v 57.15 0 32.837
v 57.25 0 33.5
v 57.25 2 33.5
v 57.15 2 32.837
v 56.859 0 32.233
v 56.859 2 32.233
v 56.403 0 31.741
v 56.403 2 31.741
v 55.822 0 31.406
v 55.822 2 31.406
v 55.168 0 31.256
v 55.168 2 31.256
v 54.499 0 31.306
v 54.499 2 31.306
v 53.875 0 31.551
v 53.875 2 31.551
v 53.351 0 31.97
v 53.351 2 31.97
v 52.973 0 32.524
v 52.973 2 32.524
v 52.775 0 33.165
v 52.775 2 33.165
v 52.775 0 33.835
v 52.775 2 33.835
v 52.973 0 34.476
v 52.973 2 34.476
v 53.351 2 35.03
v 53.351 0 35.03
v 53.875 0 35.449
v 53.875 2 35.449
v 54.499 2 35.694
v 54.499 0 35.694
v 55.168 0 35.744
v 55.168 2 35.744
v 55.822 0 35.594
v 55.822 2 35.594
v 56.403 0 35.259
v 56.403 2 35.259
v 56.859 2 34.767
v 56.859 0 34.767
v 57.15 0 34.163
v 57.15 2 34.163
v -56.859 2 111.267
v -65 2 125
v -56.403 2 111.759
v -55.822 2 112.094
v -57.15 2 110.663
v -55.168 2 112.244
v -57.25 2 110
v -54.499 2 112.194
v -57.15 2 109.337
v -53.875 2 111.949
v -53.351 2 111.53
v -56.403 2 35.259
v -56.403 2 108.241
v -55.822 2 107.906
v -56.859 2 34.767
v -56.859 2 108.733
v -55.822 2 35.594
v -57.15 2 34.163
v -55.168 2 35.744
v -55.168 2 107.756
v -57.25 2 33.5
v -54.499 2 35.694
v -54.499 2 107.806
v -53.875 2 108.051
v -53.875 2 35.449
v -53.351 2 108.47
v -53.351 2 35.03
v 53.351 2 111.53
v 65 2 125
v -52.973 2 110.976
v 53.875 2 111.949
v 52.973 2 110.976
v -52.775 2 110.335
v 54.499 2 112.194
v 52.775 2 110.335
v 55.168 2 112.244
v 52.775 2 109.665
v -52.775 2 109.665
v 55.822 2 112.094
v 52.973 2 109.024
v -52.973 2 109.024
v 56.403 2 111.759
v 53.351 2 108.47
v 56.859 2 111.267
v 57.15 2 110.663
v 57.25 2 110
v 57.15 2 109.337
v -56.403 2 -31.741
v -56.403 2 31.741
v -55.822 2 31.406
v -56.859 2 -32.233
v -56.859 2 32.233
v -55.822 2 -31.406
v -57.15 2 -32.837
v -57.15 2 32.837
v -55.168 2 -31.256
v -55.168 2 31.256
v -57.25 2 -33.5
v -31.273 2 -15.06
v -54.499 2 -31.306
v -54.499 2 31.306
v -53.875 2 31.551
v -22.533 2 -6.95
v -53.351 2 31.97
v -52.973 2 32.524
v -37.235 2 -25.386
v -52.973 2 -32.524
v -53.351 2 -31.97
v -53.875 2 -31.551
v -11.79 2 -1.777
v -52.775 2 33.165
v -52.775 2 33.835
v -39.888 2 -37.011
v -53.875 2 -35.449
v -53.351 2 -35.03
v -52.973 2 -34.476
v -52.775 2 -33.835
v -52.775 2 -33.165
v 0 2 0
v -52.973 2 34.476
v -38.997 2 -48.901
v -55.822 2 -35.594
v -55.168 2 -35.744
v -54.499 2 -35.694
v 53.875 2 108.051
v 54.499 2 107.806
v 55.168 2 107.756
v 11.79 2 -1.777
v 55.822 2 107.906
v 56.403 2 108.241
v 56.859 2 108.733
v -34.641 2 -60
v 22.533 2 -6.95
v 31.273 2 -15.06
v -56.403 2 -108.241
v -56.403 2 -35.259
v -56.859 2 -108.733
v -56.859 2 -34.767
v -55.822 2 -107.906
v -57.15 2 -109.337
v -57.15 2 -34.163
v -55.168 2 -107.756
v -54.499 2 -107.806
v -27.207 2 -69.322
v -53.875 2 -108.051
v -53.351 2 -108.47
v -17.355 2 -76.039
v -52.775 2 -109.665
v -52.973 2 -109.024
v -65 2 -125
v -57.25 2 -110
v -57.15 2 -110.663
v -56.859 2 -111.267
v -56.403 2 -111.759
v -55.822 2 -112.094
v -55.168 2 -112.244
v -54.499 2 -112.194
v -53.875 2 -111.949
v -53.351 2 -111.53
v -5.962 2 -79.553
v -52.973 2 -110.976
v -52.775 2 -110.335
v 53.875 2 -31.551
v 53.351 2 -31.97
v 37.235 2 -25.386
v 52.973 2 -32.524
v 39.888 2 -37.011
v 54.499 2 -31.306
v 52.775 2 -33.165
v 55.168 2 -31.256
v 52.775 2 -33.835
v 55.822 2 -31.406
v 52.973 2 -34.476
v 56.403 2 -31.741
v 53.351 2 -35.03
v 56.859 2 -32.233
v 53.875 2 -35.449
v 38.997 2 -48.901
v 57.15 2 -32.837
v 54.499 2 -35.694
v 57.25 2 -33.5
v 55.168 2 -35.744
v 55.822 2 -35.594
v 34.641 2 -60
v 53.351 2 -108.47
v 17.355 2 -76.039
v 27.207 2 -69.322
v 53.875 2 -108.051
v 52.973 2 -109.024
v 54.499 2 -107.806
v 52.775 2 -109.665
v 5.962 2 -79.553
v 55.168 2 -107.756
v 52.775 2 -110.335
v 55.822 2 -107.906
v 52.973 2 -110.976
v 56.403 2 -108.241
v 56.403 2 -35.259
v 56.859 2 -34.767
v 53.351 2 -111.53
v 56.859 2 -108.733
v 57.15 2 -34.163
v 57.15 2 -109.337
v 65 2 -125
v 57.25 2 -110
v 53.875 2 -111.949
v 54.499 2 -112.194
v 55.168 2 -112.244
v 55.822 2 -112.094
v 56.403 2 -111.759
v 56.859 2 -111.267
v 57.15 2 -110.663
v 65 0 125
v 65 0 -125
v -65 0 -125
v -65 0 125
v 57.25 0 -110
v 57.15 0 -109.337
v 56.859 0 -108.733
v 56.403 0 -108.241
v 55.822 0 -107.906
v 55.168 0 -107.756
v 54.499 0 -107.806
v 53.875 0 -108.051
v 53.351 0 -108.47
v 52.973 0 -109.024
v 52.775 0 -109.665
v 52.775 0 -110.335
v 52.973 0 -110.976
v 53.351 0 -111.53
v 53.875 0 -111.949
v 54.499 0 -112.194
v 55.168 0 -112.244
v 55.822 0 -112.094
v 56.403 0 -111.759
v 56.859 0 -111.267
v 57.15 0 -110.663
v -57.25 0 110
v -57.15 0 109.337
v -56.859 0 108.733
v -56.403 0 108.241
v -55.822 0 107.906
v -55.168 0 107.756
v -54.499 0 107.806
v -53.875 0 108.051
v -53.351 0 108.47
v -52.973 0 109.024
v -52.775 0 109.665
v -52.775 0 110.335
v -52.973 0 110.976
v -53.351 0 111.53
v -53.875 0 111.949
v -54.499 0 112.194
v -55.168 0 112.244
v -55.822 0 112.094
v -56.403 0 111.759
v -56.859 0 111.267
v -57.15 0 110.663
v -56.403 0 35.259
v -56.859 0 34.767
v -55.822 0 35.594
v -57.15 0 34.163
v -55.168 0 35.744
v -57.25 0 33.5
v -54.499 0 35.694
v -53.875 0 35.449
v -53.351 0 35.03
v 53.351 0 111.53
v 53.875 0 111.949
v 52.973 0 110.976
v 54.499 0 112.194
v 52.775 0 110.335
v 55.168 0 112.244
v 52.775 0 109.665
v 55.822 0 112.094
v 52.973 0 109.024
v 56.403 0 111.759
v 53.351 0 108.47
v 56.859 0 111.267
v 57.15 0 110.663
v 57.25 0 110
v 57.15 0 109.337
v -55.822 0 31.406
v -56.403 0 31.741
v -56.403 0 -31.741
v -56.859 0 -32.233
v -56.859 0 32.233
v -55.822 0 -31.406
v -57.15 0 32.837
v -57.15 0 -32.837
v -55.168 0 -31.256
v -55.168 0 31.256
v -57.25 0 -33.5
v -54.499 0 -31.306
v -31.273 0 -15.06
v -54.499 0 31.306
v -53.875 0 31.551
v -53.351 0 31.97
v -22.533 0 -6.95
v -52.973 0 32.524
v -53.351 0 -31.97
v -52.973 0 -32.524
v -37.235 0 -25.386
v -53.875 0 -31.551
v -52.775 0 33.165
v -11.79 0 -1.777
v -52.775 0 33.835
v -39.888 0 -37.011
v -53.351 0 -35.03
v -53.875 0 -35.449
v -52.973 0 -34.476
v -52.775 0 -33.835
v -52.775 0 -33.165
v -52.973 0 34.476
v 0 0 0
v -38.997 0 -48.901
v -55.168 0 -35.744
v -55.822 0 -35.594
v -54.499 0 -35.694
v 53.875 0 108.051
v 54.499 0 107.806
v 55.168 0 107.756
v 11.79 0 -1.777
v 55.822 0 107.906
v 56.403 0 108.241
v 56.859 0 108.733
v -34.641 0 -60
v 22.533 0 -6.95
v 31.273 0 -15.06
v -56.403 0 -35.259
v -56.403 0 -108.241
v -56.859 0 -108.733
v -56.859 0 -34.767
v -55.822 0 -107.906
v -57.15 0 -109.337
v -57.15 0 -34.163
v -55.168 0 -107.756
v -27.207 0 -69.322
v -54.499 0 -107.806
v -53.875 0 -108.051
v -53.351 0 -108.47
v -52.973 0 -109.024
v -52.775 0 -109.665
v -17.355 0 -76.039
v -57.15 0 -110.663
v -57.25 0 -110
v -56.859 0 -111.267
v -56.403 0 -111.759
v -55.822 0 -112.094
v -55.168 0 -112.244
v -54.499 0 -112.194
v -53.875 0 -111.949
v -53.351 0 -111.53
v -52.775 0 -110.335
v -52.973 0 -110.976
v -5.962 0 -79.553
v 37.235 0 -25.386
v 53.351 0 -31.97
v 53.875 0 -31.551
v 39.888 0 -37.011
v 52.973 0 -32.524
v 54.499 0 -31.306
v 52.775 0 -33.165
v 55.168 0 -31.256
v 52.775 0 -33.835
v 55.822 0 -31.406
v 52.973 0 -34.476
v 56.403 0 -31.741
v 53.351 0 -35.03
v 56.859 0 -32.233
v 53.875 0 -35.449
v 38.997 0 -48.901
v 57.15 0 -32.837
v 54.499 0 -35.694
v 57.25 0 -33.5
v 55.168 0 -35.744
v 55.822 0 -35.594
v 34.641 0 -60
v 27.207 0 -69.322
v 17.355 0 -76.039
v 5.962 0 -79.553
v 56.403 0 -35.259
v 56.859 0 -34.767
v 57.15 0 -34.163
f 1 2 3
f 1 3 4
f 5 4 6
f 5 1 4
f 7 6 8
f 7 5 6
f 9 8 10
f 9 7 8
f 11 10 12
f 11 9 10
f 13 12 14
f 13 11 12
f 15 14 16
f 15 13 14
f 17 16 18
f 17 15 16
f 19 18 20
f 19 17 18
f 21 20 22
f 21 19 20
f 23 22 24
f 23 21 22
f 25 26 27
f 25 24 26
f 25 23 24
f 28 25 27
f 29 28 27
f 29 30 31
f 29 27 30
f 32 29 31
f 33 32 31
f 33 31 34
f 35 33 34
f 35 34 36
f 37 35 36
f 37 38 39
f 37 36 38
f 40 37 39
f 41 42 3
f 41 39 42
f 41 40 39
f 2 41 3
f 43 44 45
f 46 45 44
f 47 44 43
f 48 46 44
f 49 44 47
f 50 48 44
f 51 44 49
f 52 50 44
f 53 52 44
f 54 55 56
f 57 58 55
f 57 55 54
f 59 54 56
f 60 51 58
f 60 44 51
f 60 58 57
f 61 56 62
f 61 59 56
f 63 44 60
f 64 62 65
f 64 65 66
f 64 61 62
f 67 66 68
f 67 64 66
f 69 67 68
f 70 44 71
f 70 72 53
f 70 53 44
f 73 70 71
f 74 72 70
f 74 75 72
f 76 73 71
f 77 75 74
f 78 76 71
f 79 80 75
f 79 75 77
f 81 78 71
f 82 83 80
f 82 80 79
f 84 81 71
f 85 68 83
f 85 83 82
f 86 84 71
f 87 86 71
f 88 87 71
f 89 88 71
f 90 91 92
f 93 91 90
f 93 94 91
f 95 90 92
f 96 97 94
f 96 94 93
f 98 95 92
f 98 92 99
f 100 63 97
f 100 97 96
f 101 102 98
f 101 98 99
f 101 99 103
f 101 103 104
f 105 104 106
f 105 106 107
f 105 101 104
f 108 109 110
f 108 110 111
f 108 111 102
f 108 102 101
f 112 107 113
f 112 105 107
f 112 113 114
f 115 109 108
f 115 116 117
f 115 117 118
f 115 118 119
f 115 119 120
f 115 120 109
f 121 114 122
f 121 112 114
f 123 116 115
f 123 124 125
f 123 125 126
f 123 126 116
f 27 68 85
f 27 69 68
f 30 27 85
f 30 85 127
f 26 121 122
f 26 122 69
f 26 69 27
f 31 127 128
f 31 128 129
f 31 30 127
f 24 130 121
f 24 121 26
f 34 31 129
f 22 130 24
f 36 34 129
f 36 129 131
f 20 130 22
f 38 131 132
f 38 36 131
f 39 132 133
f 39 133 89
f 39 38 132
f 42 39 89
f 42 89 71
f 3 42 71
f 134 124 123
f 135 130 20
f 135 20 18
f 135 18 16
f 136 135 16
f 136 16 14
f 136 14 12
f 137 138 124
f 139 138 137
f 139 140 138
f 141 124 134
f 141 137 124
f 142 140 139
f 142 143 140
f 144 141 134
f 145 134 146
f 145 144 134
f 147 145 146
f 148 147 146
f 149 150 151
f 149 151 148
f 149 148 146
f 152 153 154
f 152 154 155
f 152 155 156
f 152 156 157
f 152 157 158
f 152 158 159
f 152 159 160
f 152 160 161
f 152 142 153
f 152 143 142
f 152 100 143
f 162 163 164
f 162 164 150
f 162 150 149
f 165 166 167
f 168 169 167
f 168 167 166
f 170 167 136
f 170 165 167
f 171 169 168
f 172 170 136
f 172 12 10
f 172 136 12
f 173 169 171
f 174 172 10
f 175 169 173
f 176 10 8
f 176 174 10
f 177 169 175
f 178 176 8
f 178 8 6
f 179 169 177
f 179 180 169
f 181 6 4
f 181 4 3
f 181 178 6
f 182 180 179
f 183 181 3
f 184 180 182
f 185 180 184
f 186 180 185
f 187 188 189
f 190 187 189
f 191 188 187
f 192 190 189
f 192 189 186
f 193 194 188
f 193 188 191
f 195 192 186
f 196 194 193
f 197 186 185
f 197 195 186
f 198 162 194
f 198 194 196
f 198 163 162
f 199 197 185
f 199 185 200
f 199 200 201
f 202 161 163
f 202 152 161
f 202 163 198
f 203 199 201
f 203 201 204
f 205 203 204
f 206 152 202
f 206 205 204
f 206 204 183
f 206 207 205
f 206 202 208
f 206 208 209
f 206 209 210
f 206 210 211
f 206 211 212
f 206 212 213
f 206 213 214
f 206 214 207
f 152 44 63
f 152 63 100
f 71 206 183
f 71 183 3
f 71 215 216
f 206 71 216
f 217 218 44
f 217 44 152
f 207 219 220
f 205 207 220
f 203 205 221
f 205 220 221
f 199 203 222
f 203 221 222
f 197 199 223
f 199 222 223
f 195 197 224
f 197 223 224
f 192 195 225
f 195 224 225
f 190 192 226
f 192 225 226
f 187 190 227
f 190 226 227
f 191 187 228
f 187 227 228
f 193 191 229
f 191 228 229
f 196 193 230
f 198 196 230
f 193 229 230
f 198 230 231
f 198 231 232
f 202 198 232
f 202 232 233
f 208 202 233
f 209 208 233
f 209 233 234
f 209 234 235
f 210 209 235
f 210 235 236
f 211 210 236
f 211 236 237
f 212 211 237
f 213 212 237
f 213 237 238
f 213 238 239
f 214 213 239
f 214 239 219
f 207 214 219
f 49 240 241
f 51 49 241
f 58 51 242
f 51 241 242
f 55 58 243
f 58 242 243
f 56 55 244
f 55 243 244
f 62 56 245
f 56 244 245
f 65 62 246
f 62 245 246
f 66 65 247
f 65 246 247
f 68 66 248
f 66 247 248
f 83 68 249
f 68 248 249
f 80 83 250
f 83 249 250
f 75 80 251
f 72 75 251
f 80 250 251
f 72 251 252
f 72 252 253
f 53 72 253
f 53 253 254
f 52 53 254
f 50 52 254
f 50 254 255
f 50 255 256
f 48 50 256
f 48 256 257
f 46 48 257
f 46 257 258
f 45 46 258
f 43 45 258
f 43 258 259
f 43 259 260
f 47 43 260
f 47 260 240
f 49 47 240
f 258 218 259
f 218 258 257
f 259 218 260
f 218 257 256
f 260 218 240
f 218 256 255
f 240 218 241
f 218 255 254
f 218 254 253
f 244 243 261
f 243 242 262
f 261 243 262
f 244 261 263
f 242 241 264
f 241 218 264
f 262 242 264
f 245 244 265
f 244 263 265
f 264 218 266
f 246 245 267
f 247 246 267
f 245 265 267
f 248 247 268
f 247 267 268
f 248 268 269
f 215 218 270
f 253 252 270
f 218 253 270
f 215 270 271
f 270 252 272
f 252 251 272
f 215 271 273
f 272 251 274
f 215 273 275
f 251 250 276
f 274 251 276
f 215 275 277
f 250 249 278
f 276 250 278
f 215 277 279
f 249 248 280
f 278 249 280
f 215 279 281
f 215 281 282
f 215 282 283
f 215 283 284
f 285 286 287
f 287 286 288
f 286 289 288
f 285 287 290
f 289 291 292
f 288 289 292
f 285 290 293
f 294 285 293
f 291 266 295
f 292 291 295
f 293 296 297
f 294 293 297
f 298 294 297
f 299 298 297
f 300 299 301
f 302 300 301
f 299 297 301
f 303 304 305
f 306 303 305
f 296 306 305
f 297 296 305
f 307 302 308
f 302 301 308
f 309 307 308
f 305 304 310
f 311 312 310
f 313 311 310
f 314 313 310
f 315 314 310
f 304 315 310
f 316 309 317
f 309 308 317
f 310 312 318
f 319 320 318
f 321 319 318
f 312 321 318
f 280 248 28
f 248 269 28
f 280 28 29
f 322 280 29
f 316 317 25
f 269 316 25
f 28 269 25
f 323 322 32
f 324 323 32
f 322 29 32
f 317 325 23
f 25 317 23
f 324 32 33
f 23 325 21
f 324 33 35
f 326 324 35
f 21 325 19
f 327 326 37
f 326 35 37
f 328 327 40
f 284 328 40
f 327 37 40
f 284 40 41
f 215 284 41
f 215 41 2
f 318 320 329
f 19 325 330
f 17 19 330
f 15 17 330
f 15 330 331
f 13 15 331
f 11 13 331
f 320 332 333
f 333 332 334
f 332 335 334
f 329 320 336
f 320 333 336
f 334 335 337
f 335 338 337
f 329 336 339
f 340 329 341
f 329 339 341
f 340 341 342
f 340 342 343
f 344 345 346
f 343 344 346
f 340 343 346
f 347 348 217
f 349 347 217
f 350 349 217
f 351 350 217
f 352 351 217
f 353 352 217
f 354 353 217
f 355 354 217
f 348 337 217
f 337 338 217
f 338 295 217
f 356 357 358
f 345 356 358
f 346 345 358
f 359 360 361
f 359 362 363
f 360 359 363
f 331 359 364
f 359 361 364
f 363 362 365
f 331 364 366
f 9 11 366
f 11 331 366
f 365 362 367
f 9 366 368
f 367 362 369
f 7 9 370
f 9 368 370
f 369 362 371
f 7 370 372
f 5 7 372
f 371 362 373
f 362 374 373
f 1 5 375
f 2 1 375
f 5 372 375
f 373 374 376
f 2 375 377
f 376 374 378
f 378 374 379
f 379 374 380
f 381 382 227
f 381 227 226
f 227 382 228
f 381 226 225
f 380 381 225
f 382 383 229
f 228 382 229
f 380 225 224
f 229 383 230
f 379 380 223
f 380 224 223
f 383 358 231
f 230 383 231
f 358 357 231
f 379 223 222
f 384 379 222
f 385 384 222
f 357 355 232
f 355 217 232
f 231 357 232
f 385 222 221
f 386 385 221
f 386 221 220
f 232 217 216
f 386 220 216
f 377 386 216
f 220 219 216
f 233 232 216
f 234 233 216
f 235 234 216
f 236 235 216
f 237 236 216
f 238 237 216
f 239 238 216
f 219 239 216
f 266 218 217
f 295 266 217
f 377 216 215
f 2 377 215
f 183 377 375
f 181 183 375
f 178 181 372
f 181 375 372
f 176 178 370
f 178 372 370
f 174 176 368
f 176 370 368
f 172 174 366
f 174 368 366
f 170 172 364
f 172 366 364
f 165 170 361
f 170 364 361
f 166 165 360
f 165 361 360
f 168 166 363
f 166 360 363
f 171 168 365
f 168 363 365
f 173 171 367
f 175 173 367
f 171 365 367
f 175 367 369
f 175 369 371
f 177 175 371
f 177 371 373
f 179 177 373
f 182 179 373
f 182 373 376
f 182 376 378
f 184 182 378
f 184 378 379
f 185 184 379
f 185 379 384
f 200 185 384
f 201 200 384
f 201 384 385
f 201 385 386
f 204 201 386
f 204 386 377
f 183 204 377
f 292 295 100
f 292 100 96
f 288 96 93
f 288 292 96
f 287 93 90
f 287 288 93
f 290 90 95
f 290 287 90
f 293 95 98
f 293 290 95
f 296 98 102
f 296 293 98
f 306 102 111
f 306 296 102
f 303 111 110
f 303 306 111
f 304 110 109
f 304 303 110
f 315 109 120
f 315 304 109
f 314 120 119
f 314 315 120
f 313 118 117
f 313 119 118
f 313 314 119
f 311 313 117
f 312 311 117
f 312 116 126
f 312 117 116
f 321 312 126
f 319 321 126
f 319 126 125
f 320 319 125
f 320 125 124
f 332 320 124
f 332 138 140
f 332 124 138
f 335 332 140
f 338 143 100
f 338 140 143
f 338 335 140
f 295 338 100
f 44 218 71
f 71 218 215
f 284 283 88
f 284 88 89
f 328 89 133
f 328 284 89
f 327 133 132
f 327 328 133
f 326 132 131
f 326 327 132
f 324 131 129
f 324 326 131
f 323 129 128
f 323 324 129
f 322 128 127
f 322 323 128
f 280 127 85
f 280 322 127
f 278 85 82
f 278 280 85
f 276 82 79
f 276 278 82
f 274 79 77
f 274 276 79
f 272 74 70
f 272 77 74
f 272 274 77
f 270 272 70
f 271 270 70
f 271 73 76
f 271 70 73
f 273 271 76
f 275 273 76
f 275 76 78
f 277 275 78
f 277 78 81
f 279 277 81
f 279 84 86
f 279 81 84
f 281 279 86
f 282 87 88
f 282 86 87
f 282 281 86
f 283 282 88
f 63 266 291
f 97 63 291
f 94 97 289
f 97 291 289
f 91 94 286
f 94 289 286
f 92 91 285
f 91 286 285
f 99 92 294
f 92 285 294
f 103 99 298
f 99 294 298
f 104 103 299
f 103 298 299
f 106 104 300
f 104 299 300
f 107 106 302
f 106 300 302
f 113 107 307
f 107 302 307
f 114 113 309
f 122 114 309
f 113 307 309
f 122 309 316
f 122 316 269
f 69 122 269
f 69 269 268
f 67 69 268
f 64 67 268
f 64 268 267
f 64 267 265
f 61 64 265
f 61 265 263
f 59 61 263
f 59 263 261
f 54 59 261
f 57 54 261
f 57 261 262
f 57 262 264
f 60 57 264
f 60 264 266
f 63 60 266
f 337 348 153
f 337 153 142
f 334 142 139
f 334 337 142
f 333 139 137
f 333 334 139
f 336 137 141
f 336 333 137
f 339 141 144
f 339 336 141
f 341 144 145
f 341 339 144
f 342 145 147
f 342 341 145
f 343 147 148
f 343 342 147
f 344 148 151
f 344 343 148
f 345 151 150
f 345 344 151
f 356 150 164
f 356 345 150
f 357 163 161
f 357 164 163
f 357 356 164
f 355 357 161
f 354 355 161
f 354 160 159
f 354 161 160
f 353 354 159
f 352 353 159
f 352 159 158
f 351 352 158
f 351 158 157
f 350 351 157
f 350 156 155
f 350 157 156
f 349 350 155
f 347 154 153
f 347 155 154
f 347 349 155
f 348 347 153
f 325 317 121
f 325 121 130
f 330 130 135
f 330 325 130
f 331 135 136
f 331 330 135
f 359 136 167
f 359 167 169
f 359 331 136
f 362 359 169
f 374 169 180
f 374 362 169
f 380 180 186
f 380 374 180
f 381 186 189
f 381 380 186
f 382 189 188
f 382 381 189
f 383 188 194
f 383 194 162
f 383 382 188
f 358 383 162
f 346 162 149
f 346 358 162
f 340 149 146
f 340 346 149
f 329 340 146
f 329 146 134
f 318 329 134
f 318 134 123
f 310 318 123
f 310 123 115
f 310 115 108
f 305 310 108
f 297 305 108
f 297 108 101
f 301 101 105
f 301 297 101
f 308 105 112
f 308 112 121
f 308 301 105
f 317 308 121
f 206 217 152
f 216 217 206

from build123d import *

# Parameters (mm, degrees)
SKETCH_1_W         = 130
SKETCH_1_H         = 250
SKETCH_1_R         = 40
EXTRUDE_1_DEPTH    = 2
HOLE_WIZARD_M4_1_D = 4.5
MIRROR_2_COPY_1_D  = 4.5


with BuildPart() as part:
    # 草图1 → 凸台-拉伸1 (new body)
    with BuildSketch(Plane(origin=(0, 0, 0), x_dir=(1, 0, 0), z_dir=(0, 1, 0))):
        Rectangle(SKETCH_1_W, SKETCH_1_H)
        with Locations(Location((0, 40, 0), (0, 0, 270))):
            Circle(SKETCH_1_R, mode=Mode.SUBTRACT)
    extrude(amount=EXTRUDE_1_DEPTH)

    # M4 间隙孔1 (through all)
    with Locations(Plane(origin=(0, 2, 0), x_dir=(1, 0, 0), z_dir=(0, 1, 0))):
        with Locations((-55, -110), (-55, -33.5)):
            hole_wizard_m4_1 = Hole(HOLE_WIZARD_M4_1_D / 2)

    # 镜向1: M4 间隙孔1 across plane
    add(hole_wizard_m4_1.mirror(Plane.XY), mode=Mode.SUBTRACT)

    # 镜向2: M4 间隙孔1 across plane
    add(hole_wizard_m4_1.mirror(Plane.ZY), mode=Mode.SUBTRACT)

    # 镜向2 copy 1 (through all)
    with Locations(Plane(origin=(0, 2, 0), x_dir=(-1, 0, 0), z_dir=(0, 1, 0))):
        with Locations((-55, -110), (-55, -33.5)):
            Hole(MIRROR_2_COPY_1_D / 2)


solid = part.part
